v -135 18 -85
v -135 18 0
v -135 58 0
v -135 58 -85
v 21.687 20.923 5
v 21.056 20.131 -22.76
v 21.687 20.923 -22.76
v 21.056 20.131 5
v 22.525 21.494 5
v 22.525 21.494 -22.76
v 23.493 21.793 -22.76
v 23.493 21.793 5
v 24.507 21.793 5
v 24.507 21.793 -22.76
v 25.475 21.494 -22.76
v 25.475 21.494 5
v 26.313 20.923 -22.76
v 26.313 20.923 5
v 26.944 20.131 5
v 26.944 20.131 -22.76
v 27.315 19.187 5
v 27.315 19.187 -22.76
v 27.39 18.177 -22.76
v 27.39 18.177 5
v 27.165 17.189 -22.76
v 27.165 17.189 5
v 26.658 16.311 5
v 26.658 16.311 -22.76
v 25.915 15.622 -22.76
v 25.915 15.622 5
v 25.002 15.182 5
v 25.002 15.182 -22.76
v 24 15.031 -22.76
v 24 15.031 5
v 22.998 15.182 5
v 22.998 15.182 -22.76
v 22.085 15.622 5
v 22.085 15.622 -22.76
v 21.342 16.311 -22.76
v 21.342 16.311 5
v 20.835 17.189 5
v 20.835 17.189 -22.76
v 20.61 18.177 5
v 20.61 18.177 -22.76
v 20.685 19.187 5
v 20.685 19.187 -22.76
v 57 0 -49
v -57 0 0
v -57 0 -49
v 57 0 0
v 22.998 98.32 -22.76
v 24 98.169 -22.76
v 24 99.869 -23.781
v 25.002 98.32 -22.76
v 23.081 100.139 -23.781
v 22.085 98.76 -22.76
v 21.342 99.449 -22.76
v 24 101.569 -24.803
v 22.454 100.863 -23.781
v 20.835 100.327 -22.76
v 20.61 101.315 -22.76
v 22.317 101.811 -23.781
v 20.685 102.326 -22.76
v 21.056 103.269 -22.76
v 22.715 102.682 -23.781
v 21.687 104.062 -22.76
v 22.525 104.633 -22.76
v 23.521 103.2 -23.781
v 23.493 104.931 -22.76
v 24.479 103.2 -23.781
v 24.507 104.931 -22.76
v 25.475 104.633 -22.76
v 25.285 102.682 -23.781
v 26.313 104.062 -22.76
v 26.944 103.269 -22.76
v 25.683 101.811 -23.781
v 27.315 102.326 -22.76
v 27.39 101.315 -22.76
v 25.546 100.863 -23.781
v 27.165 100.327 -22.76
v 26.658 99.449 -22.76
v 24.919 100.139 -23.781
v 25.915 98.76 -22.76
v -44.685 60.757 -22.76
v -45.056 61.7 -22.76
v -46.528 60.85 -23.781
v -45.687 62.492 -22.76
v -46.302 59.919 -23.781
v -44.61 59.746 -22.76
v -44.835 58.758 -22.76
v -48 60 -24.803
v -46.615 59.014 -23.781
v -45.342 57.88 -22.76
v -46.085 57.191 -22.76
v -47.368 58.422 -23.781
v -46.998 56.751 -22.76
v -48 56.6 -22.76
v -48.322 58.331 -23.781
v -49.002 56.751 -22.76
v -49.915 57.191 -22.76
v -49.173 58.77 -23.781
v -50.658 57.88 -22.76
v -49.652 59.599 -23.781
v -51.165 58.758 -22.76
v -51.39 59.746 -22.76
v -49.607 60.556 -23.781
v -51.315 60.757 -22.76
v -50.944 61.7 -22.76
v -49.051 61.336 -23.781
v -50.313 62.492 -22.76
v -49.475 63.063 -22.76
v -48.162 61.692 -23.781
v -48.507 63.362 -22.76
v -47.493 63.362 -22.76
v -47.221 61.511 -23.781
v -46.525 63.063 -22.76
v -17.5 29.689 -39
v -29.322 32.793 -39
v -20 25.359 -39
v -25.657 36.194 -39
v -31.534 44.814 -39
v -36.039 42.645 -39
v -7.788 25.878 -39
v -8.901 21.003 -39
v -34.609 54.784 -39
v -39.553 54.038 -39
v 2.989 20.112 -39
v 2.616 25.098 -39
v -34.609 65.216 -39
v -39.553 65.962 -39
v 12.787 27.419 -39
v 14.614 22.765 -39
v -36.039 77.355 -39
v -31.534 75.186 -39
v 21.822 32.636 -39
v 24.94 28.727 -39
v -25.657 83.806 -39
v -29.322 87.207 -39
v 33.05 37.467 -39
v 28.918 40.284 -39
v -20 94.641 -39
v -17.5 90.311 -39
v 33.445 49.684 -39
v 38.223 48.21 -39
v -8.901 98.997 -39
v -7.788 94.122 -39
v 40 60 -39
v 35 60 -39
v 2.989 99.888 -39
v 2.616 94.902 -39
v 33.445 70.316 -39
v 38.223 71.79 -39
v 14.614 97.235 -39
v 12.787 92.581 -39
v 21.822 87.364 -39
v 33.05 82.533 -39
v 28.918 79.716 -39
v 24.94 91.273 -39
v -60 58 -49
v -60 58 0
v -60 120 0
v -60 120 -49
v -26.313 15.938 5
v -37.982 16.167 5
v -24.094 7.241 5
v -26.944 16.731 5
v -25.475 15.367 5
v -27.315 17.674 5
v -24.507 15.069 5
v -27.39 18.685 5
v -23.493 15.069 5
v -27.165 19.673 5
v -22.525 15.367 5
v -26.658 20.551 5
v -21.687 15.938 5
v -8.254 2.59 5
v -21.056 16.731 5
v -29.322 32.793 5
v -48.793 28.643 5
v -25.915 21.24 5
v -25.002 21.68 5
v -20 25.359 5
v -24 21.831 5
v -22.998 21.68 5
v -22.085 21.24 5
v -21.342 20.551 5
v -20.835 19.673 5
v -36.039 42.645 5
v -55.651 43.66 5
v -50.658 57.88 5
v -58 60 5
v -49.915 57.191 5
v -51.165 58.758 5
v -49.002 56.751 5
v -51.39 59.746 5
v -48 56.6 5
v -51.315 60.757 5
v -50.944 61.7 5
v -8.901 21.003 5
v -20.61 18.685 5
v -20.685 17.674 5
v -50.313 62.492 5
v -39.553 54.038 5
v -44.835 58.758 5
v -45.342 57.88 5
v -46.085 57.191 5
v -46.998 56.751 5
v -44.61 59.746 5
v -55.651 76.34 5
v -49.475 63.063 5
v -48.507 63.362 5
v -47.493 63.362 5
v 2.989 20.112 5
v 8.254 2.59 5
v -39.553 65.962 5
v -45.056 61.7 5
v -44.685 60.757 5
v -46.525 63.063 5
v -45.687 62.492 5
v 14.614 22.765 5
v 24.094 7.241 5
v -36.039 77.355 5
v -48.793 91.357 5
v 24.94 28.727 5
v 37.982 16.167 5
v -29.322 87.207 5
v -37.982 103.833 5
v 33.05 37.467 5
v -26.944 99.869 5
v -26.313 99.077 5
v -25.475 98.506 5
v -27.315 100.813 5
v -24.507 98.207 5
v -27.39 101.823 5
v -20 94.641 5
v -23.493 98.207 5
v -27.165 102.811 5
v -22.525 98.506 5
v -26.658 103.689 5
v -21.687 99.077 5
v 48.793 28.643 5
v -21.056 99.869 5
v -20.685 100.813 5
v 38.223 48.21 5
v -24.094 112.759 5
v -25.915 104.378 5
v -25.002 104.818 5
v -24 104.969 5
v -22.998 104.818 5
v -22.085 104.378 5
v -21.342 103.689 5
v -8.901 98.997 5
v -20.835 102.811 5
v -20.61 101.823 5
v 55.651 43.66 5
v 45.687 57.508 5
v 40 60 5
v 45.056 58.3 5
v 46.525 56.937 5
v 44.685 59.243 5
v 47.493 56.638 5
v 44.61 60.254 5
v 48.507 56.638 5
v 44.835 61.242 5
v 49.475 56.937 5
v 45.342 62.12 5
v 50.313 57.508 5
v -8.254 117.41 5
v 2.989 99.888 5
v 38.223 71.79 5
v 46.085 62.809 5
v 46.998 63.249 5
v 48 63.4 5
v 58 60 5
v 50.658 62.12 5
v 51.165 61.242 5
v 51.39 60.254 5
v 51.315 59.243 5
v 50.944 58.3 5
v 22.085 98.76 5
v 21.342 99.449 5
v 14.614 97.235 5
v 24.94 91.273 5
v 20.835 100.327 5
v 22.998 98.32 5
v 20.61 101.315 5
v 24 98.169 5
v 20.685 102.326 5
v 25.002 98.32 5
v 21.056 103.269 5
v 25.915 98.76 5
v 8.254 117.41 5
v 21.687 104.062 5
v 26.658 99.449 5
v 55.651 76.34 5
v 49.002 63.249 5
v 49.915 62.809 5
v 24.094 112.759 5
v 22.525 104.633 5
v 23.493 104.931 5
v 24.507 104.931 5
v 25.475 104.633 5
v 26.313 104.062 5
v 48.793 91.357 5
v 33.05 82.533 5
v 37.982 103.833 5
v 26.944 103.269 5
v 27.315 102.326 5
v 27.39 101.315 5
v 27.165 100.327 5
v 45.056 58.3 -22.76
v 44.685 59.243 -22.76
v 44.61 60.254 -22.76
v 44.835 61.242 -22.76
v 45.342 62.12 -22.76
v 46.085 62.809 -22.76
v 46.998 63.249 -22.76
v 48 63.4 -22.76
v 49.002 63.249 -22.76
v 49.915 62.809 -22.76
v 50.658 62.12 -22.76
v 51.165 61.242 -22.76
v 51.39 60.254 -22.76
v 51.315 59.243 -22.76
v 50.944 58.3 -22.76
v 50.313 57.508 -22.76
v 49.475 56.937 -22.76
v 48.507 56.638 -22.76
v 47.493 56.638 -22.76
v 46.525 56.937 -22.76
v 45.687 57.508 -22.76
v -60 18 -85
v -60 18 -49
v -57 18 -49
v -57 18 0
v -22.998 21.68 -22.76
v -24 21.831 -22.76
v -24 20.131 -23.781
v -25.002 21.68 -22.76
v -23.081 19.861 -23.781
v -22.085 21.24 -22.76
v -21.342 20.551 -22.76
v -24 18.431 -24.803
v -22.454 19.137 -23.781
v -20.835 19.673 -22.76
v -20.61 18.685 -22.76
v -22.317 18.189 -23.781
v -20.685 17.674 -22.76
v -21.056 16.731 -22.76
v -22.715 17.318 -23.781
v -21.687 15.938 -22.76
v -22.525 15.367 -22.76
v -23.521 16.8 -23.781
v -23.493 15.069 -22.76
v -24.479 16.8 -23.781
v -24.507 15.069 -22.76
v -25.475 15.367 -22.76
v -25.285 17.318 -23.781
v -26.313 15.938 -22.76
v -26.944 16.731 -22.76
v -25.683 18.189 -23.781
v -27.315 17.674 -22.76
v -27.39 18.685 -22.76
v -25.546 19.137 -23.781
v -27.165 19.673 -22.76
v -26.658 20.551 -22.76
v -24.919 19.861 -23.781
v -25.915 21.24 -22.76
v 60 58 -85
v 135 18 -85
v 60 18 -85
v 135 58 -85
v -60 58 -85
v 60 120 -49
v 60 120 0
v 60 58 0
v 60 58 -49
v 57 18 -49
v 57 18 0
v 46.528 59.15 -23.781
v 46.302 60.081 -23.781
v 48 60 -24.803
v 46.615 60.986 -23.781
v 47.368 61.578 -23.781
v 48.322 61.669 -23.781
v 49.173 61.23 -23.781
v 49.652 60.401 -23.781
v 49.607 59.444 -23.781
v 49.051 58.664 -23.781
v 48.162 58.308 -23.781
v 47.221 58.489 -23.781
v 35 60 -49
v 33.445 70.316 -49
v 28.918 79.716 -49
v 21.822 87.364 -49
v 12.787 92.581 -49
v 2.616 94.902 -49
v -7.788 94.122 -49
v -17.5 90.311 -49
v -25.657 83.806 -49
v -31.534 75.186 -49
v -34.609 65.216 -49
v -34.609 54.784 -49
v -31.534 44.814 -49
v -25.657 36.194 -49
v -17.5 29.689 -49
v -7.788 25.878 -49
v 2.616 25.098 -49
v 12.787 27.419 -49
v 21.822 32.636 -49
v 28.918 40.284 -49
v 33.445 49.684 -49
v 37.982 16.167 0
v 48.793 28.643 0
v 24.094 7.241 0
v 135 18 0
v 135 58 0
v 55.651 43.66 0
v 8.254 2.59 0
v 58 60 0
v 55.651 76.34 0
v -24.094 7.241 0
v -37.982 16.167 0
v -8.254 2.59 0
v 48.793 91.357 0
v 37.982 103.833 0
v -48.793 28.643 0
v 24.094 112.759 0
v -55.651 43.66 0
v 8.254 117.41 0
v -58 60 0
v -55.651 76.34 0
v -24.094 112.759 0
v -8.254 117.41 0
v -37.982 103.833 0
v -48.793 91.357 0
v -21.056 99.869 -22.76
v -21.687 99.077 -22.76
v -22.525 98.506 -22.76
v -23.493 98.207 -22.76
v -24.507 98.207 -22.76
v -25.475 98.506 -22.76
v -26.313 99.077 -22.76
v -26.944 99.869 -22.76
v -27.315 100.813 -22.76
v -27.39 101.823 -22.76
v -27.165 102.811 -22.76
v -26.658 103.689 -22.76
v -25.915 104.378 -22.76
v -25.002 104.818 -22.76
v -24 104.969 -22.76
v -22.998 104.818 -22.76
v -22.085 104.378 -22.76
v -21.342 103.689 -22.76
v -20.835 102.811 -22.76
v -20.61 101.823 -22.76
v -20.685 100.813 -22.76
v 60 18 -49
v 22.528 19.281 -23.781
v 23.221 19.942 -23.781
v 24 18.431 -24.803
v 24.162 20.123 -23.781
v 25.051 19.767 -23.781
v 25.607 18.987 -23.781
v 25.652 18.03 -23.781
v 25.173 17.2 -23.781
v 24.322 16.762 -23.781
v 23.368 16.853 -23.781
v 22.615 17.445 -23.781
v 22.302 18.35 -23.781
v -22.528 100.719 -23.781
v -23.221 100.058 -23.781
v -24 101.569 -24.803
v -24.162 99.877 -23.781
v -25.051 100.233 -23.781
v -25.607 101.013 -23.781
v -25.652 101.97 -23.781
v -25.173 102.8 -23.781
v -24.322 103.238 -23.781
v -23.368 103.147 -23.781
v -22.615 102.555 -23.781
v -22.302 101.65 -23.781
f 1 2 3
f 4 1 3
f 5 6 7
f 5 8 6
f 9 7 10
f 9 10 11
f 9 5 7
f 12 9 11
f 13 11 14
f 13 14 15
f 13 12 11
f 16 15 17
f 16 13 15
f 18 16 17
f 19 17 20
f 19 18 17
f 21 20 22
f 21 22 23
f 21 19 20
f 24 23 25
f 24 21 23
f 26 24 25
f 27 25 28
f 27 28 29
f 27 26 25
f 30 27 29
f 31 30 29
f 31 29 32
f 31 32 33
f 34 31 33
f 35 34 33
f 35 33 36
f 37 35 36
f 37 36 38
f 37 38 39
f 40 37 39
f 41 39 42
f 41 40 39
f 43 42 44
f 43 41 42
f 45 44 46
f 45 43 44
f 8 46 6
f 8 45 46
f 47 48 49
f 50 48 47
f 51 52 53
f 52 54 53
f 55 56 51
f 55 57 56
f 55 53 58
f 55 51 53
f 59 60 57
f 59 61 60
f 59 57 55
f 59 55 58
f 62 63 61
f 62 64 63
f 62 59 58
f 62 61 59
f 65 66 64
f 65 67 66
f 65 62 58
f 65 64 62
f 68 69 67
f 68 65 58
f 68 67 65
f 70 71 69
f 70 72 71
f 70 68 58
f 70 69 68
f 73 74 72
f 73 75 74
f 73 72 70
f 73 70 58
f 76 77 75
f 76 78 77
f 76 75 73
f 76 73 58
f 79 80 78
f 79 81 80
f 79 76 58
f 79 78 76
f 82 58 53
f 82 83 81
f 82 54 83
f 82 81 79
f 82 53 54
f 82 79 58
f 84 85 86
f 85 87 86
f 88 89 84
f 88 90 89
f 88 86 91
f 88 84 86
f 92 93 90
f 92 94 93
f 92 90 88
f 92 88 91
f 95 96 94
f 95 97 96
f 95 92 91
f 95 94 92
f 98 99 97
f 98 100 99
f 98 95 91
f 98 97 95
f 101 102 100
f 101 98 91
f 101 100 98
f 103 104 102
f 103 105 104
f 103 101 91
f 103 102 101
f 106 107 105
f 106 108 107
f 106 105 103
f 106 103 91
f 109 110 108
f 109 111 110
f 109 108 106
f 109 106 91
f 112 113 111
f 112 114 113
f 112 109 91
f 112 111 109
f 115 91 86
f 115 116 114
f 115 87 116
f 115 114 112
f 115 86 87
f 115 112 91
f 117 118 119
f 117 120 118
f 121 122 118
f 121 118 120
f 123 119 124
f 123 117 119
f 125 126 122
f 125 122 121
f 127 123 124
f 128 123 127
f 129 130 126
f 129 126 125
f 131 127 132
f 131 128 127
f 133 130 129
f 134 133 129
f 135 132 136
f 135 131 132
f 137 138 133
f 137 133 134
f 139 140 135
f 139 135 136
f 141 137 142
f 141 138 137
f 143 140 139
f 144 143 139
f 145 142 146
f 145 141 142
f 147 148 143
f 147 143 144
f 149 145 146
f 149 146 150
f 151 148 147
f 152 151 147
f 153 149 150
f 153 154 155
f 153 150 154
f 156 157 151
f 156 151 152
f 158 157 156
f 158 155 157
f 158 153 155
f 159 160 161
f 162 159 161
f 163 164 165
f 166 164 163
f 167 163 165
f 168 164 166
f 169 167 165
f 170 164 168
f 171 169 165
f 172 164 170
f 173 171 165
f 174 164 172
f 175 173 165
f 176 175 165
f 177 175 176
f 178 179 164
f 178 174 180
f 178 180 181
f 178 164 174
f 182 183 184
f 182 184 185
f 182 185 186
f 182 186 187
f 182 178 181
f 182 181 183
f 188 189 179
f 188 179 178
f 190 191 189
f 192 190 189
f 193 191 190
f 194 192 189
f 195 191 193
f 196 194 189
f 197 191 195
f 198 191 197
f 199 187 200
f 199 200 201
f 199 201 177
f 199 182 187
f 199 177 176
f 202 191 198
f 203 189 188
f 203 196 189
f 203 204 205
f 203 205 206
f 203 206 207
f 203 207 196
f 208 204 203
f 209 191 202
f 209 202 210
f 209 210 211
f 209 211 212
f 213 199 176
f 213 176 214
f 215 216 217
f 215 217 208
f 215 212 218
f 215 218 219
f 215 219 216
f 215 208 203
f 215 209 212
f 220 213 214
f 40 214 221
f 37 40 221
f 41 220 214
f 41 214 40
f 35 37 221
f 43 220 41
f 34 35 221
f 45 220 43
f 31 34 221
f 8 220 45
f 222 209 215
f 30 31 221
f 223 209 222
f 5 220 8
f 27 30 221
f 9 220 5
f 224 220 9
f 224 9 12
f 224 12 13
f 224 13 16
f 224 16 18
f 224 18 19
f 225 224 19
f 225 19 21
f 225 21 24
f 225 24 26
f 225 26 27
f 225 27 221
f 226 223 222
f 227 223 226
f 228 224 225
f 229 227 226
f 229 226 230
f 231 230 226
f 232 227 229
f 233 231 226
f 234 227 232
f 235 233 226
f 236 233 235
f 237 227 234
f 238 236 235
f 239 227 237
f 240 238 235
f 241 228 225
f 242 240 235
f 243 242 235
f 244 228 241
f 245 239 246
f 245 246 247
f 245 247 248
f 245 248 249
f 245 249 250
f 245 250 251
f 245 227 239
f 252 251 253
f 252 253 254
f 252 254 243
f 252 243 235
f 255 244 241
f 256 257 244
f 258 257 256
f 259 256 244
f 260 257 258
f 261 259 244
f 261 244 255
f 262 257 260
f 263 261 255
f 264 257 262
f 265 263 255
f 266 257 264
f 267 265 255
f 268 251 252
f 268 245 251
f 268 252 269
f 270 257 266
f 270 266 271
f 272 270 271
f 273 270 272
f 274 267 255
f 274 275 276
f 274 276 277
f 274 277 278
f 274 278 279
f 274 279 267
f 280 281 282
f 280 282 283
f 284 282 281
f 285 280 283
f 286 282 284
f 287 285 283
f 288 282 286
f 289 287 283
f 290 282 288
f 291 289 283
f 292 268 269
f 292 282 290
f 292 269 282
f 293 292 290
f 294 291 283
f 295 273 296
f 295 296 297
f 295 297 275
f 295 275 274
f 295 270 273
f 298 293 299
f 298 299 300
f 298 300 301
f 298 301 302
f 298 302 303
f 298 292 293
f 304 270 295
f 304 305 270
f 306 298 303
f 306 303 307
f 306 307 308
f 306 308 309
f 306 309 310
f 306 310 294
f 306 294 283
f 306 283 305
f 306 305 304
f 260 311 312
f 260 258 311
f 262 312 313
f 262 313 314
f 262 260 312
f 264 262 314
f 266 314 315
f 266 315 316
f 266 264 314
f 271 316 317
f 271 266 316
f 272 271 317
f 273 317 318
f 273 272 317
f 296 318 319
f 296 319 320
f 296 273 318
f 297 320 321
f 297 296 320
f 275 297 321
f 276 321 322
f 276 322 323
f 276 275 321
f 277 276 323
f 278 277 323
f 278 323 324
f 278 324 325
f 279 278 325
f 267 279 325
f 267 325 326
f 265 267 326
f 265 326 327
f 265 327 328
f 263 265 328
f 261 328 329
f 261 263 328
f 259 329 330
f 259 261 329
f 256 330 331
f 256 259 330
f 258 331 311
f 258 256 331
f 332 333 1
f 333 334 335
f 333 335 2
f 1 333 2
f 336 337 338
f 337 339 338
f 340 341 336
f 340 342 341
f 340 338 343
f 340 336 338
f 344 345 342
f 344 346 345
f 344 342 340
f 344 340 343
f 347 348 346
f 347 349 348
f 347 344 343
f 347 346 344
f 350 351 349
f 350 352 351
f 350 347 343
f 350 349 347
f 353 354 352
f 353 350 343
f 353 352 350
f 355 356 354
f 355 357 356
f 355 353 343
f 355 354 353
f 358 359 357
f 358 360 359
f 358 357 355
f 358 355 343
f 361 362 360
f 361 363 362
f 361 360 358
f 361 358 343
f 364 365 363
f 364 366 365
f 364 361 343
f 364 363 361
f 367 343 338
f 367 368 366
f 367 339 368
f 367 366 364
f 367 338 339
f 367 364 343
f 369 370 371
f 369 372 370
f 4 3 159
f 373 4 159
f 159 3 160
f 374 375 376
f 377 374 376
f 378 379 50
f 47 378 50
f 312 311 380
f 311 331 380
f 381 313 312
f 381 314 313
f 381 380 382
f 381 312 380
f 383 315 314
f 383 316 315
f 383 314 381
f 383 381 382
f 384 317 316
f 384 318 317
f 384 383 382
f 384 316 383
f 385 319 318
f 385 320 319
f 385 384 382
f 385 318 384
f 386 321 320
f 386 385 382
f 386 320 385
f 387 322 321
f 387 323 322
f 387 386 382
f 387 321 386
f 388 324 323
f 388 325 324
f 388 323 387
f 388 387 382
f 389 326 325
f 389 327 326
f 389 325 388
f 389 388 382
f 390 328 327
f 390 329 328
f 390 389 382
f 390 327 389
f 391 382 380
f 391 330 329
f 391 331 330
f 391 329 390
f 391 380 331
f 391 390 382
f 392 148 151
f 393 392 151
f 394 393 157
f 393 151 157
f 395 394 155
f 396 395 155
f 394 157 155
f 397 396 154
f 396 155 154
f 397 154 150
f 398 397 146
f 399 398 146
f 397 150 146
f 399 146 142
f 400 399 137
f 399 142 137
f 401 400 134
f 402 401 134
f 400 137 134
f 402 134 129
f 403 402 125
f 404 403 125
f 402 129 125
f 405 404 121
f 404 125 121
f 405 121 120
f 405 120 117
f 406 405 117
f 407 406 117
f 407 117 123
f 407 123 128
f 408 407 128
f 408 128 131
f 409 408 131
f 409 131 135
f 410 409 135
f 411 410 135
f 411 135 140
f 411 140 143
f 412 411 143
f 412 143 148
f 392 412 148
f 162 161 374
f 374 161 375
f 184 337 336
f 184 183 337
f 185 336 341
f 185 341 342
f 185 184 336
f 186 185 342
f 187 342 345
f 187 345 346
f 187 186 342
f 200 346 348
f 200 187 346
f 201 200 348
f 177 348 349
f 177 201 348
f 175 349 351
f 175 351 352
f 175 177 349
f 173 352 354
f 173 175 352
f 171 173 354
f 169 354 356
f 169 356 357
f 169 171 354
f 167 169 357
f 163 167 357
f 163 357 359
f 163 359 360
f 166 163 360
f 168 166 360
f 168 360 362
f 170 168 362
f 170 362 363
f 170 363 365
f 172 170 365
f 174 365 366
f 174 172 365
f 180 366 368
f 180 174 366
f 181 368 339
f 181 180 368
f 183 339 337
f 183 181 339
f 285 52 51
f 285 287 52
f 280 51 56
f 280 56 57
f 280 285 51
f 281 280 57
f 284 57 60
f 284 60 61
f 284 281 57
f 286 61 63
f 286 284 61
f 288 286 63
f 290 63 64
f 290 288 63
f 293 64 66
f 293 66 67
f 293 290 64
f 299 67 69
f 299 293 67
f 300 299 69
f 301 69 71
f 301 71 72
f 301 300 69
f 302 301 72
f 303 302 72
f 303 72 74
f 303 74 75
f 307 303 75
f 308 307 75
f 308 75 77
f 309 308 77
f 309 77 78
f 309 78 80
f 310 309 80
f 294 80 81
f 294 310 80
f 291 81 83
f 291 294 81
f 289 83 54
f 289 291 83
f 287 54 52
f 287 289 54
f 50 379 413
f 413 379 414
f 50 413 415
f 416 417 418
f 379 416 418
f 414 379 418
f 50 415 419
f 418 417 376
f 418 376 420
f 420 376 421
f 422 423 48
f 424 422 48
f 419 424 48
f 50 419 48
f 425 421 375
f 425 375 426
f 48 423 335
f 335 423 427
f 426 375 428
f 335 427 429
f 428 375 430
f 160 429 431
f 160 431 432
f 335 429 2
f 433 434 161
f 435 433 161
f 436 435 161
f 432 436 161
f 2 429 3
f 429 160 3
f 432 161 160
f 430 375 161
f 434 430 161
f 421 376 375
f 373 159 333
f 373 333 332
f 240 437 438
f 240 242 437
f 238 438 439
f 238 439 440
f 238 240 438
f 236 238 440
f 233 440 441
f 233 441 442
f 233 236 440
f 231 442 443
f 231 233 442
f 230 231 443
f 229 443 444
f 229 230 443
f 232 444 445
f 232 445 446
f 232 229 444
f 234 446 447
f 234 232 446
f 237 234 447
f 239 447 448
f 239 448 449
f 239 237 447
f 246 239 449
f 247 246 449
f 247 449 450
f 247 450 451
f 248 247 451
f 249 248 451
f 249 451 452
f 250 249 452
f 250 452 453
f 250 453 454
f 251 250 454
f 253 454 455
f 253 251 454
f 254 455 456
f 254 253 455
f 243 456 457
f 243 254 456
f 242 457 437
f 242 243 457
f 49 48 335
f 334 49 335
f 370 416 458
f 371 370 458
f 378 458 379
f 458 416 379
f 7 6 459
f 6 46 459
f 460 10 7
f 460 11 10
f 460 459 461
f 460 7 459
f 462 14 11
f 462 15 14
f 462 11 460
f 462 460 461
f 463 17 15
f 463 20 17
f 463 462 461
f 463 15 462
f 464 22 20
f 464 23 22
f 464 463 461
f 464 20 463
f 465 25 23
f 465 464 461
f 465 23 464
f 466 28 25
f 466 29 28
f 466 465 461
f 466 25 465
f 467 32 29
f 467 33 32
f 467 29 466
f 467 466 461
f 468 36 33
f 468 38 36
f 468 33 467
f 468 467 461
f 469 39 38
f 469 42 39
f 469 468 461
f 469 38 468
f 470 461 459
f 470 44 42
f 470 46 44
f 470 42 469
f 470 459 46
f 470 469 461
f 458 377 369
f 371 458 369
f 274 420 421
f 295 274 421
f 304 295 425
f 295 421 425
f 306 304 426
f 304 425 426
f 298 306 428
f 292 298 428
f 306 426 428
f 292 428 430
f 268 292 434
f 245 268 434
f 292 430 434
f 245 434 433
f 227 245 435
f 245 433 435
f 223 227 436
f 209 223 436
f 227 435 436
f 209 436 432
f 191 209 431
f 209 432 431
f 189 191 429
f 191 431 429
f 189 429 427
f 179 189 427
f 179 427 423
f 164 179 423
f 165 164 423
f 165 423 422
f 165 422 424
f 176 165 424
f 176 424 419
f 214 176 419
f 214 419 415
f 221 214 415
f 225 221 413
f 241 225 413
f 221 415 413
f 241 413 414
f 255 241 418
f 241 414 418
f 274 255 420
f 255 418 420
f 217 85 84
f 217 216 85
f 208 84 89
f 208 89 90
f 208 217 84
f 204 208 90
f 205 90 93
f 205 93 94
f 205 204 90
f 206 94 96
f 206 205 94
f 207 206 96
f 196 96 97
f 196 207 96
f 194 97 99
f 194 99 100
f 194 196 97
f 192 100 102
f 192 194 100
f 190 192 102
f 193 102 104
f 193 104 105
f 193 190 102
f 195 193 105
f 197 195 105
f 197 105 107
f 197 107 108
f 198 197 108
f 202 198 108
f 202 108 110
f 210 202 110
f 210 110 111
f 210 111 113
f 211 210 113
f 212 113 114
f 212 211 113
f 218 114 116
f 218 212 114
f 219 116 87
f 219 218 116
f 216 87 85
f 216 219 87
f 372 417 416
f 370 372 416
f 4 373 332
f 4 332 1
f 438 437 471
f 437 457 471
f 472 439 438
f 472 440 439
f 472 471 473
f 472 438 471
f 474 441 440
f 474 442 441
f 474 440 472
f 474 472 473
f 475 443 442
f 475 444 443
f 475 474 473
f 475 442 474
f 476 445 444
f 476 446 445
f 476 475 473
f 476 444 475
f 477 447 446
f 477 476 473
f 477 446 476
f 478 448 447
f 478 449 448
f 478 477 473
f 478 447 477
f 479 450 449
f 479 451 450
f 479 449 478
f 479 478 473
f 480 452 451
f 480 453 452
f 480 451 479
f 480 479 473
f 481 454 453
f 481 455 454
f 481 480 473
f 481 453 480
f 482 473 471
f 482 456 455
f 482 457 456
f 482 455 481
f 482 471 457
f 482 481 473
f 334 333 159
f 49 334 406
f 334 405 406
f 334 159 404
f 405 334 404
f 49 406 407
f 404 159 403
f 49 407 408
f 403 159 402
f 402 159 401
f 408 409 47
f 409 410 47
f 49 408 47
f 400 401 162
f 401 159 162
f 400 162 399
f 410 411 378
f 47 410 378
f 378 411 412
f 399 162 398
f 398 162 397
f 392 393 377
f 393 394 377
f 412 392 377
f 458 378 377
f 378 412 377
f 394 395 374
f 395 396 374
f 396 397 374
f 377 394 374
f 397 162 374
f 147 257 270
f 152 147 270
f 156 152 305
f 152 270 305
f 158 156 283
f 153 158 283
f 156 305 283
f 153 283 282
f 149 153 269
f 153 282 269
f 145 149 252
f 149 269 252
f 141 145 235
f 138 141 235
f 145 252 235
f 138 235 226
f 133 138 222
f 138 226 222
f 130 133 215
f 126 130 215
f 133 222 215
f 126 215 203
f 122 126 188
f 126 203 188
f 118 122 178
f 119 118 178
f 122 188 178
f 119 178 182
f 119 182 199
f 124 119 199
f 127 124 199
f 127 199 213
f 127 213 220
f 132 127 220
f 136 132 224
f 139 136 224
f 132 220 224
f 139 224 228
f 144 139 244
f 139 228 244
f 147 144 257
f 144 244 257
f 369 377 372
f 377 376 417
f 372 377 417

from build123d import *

# Parameters (mm, degrees)
EXTRUDE_1_DEPTH          = 85
SKETCH_2_R               = 58
EXTRUDE_2_DEPTH          = 5
SKETCH_3_R               = 40
CUT_EXTRUDE_1_DEPTH      = 44
SKETCH_4_R               = 35
CUT_EXTRUDE_2_DEPTH      = 187.38937738
PATTERN_CIRCULAR_1_COUNT = 6
SKETCH_8_W               = 120
SKETCH_8_H               = 36
CUT_EXTRUDE_3_DEPTH      = 200.624647777


with BuildPart() as part:
    # 草图1 → 凸台-拉伸1 (new body)
    with BuildSketch(Plane.XY):
        Polygon((0, 0), (-57, 0), (-57, 18), (-135, 18), (-135, 58), (-60, 58), (-60, 120), (60, 120), (60, 58), (135, 58), (135, 18), (57, 18), (57, 0), align=None)
    extrude(amount=-EXTRUDE_1_DEPTH)

    # 草图2 → 凸台-拉伸2 (add)
    with BuildSketch(Plane.XY):
        with Locations((0, 60)):
            Circle(SKETCH_2_R)
    extrude(amount=EXTRUDE_2_DEPTH)

    # 草图3 → 切除-拉伸1 (cut)
    with BuildSketch(Plane.XY.offset(5)):
        with Locations((0, 60)):
            Circle(SKETCH_3_R)
    extrude(amount=-CUT_EXTRUDE_1_DEPTH, mode=Mode.SUBTRACT)

    # 草图4 → 切除-拉伸2 (cut, through all)
    with BuildSketch(Plane.XY.offset(-39)):
        with Locations((0, 60)):
            Circle(SKETCH_4_R)
    extrude(amount=-CUT_EXTRUDE_2_DEPTH, mode=Mode.SUBTRACT)

    # 草图7 → M8 螺纹孔1 (revolve, cut)
    with BuildSketch(Plane(origin=(24, 101.569219382, 5), x_dir=(0, -1, 0), z_dir=(1, 0, 0))):
        Polygon((0, 0), (0, 29.802926105), (3.4, 27.76), (3.4, 0), align=None)
    hole_wizard_m8_1 = revolve(axis=Axis((24, 101.569219382, 11.35), (0, 0, -1)), mode=Mode.SUBTRACT)

    # 阵列(圆周)1: M8 螺纹孔1 ×6 about axis
    pattern_circular_1_axis = Axis((0, 60, 0), (0, 0, 1))
    for i in range(1, PATTERN_CIRCULAR_1_COUNT):
        add(hole_wizard_m8_1.rotate(pattern_circular_1_axis, i * 360 / PATTERN_CIRCULAR_1_COUNT), mode=Mode.SUBTRACT)

    # 草图8 → 切除-拉伸3 (cut, through all)
    with BuildSketch(Plane(origin=(0, 120, 0), x_dir=(1, 0, 0), z_dir=(0, 1, 0))):
        with Locations((0, 67)):
            Rectangle(SKETCH_8_W, SKETCH_8_H)
    extrude(amount=-CUT_EXTRUDE_3_DEPTH, mode=Mode.SUBTRACT)


solid = part.part
